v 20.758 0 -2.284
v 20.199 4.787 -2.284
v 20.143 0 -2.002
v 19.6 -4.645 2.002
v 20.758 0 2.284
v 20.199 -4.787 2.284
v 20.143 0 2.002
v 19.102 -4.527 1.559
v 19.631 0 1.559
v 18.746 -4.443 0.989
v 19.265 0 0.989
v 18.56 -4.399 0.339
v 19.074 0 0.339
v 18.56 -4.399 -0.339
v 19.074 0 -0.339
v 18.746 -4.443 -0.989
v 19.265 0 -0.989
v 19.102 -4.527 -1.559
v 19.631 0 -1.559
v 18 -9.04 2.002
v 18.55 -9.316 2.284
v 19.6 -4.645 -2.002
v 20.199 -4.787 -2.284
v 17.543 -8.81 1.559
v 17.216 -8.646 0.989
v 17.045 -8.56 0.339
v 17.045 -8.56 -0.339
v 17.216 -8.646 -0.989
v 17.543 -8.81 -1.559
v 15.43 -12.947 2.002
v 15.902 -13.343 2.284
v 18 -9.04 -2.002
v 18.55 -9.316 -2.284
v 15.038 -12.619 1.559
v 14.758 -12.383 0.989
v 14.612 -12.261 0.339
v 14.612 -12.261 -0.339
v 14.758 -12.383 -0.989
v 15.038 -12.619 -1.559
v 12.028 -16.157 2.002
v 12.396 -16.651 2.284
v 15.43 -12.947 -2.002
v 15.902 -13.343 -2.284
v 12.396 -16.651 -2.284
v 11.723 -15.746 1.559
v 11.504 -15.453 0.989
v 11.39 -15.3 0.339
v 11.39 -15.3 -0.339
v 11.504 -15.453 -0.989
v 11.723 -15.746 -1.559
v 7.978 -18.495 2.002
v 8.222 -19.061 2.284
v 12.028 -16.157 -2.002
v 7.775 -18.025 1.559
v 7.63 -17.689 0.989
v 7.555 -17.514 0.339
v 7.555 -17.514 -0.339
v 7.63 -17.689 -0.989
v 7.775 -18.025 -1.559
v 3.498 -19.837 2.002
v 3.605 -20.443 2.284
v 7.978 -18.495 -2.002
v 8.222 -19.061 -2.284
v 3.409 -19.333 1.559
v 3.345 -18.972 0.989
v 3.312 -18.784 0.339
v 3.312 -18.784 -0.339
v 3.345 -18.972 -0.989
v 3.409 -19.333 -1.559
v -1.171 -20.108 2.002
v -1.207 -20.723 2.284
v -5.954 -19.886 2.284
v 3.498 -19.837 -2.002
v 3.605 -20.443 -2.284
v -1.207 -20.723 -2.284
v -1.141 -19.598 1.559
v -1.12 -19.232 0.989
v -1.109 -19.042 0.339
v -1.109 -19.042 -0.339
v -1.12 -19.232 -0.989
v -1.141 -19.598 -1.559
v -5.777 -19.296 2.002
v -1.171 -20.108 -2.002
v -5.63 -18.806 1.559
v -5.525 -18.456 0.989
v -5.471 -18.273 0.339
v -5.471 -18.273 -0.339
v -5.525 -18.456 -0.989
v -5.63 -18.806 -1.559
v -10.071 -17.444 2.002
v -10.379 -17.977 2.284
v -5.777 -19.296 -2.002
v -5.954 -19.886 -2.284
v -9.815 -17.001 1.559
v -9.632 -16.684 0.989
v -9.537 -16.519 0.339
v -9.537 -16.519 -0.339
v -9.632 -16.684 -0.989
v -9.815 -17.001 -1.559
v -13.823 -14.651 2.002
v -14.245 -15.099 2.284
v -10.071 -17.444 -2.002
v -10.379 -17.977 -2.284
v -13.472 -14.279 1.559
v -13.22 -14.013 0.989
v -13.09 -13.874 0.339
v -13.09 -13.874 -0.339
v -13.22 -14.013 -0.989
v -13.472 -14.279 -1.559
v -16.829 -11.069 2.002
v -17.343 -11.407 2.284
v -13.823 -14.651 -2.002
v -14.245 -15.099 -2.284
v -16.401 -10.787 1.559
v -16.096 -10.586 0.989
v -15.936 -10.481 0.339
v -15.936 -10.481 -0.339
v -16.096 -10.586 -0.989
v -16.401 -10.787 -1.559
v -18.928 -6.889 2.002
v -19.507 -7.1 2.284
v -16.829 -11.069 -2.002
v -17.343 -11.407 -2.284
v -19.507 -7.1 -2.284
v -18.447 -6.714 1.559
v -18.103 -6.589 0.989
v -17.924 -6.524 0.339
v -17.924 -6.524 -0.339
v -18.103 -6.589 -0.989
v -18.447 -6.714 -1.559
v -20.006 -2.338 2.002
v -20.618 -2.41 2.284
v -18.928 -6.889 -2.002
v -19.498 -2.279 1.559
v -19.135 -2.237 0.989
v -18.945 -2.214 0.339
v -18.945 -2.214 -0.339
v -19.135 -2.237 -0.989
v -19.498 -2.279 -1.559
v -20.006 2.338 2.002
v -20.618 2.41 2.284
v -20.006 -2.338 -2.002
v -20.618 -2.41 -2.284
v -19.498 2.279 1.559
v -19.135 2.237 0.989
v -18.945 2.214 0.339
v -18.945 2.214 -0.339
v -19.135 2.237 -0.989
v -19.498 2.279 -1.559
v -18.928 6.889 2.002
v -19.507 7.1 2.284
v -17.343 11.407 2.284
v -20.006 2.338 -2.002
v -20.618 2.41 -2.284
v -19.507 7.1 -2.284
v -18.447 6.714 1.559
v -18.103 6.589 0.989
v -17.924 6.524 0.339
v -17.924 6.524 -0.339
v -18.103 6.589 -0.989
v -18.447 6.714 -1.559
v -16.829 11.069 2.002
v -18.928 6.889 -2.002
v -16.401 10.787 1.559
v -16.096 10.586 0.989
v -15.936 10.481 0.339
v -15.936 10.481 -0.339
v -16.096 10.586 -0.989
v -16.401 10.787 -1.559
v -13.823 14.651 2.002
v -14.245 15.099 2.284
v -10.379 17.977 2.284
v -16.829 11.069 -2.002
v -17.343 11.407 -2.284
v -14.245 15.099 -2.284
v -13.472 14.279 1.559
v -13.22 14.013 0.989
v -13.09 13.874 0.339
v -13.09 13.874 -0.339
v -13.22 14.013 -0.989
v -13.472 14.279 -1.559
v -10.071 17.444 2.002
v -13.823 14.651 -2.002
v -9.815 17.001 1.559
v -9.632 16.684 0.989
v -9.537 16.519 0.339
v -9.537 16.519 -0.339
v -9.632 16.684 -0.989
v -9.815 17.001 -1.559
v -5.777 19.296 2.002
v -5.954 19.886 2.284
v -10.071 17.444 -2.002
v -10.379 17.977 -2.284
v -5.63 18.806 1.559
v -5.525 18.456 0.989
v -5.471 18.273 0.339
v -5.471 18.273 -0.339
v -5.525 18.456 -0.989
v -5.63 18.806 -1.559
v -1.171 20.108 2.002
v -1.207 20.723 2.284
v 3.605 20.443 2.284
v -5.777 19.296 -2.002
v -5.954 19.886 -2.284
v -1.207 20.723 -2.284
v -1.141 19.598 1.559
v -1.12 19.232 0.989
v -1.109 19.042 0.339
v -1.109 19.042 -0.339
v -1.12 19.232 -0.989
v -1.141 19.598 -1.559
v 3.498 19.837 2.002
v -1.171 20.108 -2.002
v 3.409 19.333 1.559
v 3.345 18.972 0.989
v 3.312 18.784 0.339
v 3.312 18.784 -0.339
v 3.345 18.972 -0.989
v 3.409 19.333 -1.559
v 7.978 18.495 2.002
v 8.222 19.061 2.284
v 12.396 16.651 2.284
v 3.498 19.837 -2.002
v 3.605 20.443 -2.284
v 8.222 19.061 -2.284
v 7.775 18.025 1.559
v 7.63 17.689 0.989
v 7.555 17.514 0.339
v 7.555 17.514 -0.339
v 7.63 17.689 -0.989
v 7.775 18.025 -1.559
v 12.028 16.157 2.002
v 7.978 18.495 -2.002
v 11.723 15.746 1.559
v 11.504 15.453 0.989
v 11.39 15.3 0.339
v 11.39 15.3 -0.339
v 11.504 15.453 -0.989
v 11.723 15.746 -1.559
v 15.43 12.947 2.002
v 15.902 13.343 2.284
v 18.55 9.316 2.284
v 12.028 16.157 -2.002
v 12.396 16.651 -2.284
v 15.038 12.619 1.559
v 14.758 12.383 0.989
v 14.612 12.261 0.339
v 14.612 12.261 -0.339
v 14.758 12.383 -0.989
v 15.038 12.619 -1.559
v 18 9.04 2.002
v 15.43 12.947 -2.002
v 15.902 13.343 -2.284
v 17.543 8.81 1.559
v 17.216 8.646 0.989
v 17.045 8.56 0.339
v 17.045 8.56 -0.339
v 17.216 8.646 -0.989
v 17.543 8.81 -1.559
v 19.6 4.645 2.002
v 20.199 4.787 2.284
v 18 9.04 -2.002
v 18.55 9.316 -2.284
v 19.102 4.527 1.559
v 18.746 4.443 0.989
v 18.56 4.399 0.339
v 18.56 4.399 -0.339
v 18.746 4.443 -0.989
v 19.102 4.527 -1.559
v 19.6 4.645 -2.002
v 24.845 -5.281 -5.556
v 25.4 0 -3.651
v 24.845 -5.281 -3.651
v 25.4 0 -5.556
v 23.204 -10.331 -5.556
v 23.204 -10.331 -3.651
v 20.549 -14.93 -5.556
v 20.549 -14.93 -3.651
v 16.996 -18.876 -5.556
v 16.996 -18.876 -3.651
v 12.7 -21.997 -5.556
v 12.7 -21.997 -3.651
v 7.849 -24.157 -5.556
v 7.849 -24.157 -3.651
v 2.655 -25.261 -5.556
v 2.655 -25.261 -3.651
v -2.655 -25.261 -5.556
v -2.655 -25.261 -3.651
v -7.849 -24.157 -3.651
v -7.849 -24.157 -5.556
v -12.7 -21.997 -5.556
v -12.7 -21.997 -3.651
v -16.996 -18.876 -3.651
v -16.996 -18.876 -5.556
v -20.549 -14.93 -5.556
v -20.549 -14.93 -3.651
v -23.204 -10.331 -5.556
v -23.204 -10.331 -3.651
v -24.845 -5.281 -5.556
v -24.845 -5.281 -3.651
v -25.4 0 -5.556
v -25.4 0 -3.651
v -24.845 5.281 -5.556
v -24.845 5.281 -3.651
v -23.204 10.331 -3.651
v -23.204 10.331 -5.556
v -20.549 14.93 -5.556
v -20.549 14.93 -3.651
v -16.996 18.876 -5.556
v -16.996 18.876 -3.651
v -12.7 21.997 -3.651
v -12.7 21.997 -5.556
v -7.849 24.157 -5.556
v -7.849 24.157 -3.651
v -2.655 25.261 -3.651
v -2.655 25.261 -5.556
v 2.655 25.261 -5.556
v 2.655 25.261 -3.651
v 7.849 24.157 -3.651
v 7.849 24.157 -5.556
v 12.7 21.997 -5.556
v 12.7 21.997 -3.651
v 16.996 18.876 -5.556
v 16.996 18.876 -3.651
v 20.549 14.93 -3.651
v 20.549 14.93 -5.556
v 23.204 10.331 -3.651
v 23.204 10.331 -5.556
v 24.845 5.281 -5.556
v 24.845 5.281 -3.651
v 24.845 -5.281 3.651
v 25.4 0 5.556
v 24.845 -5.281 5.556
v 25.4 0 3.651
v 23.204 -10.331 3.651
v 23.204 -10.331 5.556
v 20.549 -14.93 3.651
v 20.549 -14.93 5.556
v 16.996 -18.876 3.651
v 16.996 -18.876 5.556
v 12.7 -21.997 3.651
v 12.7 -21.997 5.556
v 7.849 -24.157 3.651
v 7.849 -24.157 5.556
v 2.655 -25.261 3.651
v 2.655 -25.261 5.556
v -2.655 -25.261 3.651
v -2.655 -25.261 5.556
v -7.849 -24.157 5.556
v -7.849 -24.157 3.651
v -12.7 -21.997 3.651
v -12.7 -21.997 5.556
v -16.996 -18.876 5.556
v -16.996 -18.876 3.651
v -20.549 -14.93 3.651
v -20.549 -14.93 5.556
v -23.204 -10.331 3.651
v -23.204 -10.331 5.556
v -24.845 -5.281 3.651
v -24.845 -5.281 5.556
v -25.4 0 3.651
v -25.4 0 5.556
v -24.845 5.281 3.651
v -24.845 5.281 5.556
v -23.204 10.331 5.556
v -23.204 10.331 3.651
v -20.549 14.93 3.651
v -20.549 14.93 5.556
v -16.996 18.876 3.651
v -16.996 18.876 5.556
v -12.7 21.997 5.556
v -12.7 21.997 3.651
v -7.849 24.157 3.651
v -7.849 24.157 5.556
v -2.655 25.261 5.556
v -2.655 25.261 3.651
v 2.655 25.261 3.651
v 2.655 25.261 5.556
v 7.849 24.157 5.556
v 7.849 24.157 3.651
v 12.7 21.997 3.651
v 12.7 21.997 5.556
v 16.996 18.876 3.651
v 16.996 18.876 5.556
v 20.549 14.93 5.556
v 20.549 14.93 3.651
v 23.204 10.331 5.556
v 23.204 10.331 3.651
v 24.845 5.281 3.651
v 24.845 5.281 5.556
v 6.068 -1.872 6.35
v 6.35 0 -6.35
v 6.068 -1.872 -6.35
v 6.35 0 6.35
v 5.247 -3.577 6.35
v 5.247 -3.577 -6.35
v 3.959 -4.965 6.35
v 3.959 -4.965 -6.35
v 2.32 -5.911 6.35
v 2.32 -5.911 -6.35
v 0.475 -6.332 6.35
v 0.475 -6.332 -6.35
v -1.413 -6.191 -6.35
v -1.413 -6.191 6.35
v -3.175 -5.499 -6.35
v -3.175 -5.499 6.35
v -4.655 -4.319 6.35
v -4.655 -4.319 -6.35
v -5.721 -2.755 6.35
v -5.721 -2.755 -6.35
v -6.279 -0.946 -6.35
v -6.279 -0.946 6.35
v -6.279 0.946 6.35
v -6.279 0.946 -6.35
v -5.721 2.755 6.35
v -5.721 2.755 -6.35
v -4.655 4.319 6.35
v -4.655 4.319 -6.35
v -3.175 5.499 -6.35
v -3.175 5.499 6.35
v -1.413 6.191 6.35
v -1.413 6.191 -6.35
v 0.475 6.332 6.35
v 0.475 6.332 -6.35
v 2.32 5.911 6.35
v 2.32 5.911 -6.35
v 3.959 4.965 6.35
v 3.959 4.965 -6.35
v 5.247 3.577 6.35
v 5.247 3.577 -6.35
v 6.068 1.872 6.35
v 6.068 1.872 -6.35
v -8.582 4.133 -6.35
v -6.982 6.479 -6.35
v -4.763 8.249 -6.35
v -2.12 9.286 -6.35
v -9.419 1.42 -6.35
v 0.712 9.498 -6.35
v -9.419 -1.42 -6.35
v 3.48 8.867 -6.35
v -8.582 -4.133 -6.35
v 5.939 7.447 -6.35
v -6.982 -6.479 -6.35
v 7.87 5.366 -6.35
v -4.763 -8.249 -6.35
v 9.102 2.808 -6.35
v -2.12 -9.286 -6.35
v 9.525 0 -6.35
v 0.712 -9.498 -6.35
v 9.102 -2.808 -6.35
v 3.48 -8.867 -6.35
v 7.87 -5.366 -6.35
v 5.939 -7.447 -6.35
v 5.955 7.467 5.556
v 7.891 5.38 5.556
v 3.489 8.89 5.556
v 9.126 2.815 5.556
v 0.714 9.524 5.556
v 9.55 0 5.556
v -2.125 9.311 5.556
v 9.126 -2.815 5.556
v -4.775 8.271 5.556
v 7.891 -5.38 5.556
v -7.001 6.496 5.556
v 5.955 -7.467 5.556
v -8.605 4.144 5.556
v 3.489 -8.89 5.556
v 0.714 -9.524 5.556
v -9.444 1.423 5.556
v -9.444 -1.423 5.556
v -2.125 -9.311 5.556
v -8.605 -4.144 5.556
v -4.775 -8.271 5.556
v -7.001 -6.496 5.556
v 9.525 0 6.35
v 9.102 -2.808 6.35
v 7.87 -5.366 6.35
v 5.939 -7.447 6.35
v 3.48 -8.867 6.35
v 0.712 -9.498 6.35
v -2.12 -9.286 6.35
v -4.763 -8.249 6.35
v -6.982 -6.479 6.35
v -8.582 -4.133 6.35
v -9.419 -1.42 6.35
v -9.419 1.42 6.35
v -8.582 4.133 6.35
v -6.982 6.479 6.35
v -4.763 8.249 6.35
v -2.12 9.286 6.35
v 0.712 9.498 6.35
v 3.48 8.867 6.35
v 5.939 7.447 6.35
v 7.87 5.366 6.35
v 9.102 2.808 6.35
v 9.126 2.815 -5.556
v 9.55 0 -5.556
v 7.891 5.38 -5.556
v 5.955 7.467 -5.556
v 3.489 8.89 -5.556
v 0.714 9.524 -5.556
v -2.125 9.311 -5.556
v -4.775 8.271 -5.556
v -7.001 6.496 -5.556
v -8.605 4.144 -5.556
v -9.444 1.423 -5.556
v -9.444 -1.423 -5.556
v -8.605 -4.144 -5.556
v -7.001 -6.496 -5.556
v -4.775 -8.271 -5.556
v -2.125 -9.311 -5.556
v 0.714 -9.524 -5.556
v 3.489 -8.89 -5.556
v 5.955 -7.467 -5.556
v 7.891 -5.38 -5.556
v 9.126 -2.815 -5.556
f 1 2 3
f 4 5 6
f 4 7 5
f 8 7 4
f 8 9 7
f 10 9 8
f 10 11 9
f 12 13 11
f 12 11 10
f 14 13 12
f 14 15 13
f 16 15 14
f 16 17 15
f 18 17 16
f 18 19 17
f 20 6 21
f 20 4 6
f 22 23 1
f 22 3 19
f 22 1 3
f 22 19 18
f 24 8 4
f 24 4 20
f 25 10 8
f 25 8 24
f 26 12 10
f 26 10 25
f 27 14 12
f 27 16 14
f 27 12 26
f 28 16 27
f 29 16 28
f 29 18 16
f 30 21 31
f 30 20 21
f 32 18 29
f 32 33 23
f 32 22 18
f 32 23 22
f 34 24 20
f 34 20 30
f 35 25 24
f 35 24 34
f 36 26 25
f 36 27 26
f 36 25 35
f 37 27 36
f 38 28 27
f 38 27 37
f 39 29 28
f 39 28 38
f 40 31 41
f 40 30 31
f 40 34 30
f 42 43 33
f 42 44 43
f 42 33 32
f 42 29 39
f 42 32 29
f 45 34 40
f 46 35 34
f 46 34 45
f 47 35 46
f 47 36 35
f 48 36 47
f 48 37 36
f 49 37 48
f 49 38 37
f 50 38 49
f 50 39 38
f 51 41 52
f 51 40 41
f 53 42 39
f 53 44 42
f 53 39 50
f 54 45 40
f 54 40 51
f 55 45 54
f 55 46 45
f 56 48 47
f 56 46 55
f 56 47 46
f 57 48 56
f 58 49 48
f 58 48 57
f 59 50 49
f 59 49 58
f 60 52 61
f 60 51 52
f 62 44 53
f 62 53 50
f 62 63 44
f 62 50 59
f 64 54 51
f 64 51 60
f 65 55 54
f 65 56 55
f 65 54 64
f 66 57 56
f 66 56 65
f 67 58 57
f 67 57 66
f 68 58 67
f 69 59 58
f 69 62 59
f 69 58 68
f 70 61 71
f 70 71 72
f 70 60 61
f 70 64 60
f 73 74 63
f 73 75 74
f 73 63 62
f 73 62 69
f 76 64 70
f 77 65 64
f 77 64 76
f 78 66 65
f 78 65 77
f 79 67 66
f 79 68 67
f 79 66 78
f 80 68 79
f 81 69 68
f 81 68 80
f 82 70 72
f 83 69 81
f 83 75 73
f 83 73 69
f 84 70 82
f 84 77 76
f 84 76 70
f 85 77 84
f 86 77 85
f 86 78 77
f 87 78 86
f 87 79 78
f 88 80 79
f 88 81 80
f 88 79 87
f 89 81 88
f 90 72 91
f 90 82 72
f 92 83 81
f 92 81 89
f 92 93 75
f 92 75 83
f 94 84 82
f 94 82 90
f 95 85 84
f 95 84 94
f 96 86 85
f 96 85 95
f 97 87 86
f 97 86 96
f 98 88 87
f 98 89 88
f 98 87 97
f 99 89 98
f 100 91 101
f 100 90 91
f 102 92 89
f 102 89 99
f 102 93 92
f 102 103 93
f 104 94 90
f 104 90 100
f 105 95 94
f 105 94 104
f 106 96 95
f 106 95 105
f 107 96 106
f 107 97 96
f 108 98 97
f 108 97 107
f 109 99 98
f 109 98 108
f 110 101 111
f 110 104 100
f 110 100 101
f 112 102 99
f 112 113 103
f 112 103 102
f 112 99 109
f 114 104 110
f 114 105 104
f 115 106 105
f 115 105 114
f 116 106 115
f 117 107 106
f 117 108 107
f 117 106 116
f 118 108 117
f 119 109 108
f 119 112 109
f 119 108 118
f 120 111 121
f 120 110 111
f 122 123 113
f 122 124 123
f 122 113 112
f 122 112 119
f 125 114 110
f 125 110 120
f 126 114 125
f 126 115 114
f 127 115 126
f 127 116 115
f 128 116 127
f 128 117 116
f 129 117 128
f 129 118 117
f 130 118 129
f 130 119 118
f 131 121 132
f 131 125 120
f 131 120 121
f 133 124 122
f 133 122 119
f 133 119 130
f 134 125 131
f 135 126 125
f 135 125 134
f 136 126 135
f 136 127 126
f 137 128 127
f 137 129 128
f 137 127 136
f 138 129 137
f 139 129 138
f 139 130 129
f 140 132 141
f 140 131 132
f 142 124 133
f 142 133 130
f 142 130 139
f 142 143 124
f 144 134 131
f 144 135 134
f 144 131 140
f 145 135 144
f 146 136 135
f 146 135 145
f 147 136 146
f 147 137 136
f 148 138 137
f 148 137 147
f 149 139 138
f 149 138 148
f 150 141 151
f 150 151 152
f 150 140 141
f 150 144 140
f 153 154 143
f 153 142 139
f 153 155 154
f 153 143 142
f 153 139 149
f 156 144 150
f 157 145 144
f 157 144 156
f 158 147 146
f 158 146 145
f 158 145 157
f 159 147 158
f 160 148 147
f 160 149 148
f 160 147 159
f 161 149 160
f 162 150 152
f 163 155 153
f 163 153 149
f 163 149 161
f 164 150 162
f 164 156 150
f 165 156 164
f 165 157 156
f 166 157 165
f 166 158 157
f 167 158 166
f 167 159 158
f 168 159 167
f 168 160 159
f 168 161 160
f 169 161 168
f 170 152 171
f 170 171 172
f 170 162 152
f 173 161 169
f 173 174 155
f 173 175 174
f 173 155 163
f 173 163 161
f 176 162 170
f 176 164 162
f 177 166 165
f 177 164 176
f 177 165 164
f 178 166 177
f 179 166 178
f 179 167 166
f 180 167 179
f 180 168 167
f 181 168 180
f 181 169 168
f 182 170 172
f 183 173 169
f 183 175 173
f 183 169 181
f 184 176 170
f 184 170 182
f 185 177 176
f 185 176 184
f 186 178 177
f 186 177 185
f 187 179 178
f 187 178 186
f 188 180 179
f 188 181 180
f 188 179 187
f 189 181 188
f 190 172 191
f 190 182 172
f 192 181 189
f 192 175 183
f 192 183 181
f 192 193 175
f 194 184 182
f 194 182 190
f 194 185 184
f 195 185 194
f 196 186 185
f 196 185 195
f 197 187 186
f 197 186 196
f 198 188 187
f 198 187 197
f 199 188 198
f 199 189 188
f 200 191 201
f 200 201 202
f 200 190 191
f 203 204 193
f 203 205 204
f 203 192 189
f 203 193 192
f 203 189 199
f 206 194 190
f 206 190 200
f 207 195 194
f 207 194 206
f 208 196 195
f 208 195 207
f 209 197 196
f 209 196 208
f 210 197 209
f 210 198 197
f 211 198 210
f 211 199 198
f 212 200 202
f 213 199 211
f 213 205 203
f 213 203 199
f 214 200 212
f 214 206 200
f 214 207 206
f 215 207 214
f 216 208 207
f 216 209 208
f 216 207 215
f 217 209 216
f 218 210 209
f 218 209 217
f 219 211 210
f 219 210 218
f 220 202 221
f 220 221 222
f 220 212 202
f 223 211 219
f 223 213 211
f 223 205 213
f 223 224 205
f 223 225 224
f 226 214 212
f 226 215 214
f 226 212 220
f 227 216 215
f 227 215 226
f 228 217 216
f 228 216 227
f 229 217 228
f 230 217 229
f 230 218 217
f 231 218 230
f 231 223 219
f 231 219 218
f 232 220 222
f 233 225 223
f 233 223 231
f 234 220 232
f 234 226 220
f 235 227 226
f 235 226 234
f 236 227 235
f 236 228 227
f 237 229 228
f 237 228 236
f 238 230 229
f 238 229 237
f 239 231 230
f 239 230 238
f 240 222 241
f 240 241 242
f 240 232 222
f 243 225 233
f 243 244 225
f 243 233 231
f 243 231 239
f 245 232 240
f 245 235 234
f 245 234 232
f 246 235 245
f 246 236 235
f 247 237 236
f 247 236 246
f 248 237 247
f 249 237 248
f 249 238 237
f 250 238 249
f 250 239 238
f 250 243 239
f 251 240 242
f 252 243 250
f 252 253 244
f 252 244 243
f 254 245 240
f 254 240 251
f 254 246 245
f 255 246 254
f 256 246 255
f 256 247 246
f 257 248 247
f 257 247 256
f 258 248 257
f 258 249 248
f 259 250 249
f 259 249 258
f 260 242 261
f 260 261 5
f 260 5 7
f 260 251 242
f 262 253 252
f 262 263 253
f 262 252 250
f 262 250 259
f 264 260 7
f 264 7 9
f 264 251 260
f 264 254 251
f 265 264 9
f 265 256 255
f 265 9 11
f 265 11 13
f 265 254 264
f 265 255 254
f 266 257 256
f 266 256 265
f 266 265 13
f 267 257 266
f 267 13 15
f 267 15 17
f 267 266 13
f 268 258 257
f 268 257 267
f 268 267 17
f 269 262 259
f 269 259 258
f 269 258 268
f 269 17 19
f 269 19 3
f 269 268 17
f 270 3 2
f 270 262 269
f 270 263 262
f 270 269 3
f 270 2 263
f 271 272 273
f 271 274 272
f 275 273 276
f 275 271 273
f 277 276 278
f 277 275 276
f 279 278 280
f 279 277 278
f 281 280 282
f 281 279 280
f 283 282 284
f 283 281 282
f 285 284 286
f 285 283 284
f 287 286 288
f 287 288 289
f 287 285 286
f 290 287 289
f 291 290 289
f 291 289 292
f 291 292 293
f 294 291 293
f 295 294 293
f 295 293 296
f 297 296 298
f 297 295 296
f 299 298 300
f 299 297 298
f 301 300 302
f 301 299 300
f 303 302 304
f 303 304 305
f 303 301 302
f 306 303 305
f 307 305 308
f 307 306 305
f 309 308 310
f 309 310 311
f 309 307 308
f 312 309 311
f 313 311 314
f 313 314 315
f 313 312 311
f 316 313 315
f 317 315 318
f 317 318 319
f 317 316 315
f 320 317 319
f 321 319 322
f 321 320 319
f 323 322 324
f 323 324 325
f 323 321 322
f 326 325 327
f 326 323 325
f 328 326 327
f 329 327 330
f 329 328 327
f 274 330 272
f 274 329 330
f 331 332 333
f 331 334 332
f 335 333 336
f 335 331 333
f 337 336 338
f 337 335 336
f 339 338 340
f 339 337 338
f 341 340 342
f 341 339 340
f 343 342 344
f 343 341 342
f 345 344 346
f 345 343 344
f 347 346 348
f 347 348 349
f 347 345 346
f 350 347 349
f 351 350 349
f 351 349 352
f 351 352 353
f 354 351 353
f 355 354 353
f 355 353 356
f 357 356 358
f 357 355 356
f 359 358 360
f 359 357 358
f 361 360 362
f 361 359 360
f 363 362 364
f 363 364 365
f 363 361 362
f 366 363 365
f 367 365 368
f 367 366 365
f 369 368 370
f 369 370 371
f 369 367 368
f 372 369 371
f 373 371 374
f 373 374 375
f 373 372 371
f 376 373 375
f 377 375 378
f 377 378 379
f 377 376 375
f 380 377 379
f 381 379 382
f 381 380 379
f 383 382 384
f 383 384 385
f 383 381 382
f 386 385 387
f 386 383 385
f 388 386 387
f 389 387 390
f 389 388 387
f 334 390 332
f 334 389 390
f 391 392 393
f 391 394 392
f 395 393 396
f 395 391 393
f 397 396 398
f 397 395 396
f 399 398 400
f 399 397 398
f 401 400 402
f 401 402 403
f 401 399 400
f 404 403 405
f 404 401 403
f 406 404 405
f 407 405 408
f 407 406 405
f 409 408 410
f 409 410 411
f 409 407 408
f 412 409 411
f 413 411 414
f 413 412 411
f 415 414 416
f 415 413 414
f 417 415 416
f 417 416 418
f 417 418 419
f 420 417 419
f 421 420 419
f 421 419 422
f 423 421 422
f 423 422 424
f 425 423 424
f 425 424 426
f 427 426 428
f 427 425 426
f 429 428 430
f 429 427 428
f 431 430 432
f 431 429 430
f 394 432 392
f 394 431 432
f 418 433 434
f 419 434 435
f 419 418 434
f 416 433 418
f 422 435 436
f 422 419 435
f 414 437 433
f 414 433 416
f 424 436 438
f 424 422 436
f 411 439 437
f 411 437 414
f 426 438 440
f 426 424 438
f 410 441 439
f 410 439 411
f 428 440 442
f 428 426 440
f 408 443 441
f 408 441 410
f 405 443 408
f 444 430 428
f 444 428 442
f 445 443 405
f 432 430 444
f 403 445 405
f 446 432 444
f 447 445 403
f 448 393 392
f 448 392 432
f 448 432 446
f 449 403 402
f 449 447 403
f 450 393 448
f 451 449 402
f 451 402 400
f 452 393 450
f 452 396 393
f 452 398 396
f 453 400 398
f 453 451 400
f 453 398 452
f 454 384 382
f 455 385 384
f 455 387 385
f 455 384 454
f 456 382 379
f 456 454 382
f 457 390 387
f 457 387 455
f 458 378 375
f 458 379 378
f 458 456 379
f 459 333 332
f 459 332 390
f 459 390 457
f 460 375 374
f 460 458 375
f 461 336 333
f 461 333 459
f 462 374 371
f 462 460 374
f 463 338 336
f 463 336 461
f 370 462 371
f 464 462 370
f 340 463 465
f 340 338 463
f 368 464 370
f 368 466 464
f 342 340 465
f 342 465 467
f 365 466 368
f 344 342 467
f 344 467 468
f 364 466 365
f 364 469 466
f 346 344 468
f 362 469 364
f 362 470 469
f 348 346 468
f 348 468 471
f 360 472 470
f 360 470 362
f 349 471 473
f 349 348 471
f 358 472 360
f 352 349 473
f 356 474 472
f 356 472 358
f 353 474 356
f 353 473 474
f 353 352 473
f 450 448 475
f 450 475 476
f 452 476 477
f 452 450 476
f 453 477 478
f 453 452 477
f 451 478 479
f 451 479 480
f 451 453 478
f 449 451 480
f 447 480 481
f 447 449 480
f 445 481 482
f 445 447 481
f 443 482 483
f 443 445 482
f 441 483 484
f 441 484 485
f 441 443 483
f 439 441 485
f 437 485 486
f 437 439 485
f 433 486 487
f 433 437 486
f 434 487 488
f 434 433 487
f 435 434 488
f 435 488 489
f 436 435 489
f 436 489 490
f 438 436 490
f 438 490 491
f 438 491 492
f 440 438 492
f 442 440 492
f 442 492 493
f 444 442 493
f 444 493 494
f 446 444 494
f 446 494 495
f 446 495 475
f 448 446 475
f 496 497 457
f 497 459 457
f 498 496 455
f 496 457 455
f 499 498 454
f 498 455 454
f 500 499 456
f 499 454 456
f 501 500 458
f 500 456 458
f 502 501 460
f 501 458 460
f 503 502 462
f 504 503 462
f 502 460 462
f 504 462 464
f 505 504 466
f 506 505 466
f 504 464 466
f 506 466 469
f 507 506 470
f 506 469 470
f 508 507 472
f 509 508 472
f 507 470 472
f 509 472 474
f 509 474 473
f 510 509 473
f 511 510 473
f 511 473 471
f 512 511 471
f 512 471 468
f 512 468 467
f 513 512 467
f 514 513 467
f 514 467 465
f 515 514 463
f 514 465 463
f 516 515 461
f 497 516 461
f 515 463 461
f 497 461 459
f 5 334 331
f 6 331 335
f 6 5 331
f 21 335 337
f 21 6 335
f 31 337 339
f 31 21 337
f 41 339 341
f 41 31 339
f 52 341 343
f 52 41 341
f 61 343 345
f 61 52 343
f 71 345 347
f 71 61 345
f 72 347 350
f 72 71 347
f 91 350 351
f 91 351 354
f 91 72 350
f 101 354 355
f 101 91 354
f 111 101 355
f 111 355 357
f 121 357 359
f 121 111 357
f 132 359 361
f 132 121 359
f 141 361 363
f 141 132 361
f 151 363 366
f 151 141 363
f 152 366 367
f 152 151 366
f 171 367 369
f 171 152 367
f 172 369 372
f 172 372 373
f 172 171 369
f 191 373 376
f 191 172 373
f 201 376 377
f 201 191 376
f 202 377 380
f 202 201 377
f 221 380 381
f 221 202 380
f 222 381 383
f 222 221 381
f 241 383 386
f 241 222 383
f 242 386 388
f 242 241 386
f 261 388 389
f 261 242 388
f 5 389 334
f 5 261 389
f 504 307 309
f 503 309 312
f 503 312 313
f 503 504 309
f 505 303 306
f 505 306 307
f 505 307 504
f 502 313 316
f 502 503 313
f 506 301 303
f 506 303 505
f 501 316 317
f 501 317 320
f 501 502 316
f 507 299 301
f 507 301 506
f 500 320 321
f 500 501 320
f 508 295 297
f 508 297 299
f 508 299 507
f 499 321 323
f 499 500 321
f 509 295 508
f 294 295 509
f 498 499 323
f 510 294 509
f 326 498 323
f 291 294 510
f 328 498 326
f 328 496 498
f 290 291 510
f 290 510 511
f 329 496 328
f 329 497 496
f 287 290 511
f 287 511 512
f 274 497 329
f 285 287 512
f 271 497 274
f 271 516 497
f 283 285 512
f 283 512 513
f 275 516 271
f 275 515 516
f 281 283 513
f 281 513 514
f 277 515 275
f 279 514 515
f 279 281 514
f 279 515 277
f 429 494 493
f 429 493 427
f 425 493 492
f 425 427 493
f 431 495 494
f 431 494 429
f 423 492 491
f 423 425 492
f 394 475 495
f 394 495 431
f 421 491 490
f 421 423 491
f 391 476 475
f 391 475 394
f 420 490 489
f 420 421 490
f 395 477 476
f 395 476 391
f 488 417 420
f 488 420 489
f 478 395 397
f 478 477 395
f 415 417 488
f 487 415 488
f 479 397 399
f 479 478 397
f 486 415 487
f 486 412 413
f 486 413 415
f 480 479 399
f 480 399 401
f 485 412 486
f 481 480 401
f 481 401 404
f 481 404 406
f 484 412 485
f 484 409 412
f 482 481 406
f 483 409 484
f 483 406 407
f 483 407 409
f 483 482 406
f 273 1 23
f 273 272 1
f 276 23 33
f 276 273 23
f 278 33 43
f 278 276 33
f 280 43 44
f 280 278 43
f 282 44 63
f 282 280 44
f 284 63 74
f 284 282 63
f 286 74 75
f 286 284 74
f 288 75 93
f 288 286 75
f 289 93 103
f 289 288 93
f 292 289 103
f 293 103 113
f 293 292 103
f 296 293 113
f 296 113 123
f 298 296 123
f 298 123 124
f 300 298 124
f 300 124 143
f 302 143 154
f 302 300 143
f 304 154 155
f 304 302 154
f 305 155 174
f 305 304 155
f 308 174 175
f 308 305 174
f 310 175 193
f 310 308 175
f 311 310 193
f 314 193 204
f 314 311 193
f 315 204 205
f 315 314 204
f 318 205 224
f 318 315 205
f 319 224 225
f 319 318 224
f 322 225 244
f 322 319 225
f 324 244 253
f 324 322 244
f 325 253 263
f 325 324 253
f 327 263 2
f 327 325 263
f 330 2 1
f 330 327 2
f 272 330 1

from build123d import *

# Parameters (mm, degrees)
SKETCH2_R                    = 9.5504
SKETCH2_R_2                  = 9.525
CUT_EXTRUDE_THIN1_DEPTH      = 37.477972806
CUT_EXTRUDE_THIN1_DEPTH_BACK = 37.477972806


with BuildPart() as part:
    # Sketch1 → Revolve1 (revolve)
    with BuildSketch(Plane(origin=(0, 0, 0), x_dir=(0, 0, -1), z_dir=(1, 0, 0)), mode=Mode.PRIVATE) as revolve1_sk:
        with BuildLine():
            Line((3.65125, 25.4), (5.55625, 25.4))
            Line((5.55625, 25.4), (5.55625, 9.525))
            Line((5.55625, 9.525), (6.35, 9.525))
            Line((6.35, 9.525), (6.35, 6.35))
            Line((6.35, 6.35), (-6.35, 6.35))
            Line((-6.35, 6.35), (-6.35, 9.525))
            Line((-6.35, 9.525), (-5.55625, 9.525))
            Line((-5.55625, 9.525), (-5.55625, 25.4))
            Line((-5.55625, 25.4), (-3.65125, 25.4))
            Line((-3.65125, 25.4), (-2.284240955, 20.758498321))
            ThreePointArc((-2.284240955, 20.758498321), (0, 19.05), (2.284240955, 20.758498321))
            Line((2.284240955, 20.758498321), (3.65125, 25.4))
        make_face()
    revolve(revolve1_sk.sketch.rotate(Axis((0, 0, 6.35), (0, 0, -1)), 90), axis=Axis((0, 0, 6.35), (0, 0, -1)))

    # Sketch2 → Cut-Extrude-Thin1 (cut, two sides)
    with BuildSketch(Plane.XY) as cut_extrude_thin1_sk:
        Circle(SKETCH2_R)
        Circle(SKETCH2_R_2, mode=Mode.SUBTRACT)
    extrude(amount=CUT_EXTRUDE_THIN1_DEPTH, mode=Mode.SUBTRACT)
    extrude(cut_extrude_thin1_sk.sketch, amount=-CUT_EXTRUDE_THIN1_DEPTH_BACK, mode=Mode.SUBTRACT)


with BuildPart() as cut_extrude_thin1_piece_1:
    # of the separate pieces the step leaves, piece 1, a body of its own (cut_extrude_thin1_pieces)
    add(part.part.solids().sort_by_distance((25.4, 0, -3.65125))[0])


with BuildPart() as cut_extrude_thin1_piece_2:
    # of the separate pieces the step leaves, piece 2, a body of its own (cut_extrude_thin1_pieces)
    add(part.part.solids().sort_by_distance((9.525, 0, -5.55625))[0])


solid = Compound([cut_extrude_thin1_piece_1.part, cut_extrude_thin1_piece_2.part])
